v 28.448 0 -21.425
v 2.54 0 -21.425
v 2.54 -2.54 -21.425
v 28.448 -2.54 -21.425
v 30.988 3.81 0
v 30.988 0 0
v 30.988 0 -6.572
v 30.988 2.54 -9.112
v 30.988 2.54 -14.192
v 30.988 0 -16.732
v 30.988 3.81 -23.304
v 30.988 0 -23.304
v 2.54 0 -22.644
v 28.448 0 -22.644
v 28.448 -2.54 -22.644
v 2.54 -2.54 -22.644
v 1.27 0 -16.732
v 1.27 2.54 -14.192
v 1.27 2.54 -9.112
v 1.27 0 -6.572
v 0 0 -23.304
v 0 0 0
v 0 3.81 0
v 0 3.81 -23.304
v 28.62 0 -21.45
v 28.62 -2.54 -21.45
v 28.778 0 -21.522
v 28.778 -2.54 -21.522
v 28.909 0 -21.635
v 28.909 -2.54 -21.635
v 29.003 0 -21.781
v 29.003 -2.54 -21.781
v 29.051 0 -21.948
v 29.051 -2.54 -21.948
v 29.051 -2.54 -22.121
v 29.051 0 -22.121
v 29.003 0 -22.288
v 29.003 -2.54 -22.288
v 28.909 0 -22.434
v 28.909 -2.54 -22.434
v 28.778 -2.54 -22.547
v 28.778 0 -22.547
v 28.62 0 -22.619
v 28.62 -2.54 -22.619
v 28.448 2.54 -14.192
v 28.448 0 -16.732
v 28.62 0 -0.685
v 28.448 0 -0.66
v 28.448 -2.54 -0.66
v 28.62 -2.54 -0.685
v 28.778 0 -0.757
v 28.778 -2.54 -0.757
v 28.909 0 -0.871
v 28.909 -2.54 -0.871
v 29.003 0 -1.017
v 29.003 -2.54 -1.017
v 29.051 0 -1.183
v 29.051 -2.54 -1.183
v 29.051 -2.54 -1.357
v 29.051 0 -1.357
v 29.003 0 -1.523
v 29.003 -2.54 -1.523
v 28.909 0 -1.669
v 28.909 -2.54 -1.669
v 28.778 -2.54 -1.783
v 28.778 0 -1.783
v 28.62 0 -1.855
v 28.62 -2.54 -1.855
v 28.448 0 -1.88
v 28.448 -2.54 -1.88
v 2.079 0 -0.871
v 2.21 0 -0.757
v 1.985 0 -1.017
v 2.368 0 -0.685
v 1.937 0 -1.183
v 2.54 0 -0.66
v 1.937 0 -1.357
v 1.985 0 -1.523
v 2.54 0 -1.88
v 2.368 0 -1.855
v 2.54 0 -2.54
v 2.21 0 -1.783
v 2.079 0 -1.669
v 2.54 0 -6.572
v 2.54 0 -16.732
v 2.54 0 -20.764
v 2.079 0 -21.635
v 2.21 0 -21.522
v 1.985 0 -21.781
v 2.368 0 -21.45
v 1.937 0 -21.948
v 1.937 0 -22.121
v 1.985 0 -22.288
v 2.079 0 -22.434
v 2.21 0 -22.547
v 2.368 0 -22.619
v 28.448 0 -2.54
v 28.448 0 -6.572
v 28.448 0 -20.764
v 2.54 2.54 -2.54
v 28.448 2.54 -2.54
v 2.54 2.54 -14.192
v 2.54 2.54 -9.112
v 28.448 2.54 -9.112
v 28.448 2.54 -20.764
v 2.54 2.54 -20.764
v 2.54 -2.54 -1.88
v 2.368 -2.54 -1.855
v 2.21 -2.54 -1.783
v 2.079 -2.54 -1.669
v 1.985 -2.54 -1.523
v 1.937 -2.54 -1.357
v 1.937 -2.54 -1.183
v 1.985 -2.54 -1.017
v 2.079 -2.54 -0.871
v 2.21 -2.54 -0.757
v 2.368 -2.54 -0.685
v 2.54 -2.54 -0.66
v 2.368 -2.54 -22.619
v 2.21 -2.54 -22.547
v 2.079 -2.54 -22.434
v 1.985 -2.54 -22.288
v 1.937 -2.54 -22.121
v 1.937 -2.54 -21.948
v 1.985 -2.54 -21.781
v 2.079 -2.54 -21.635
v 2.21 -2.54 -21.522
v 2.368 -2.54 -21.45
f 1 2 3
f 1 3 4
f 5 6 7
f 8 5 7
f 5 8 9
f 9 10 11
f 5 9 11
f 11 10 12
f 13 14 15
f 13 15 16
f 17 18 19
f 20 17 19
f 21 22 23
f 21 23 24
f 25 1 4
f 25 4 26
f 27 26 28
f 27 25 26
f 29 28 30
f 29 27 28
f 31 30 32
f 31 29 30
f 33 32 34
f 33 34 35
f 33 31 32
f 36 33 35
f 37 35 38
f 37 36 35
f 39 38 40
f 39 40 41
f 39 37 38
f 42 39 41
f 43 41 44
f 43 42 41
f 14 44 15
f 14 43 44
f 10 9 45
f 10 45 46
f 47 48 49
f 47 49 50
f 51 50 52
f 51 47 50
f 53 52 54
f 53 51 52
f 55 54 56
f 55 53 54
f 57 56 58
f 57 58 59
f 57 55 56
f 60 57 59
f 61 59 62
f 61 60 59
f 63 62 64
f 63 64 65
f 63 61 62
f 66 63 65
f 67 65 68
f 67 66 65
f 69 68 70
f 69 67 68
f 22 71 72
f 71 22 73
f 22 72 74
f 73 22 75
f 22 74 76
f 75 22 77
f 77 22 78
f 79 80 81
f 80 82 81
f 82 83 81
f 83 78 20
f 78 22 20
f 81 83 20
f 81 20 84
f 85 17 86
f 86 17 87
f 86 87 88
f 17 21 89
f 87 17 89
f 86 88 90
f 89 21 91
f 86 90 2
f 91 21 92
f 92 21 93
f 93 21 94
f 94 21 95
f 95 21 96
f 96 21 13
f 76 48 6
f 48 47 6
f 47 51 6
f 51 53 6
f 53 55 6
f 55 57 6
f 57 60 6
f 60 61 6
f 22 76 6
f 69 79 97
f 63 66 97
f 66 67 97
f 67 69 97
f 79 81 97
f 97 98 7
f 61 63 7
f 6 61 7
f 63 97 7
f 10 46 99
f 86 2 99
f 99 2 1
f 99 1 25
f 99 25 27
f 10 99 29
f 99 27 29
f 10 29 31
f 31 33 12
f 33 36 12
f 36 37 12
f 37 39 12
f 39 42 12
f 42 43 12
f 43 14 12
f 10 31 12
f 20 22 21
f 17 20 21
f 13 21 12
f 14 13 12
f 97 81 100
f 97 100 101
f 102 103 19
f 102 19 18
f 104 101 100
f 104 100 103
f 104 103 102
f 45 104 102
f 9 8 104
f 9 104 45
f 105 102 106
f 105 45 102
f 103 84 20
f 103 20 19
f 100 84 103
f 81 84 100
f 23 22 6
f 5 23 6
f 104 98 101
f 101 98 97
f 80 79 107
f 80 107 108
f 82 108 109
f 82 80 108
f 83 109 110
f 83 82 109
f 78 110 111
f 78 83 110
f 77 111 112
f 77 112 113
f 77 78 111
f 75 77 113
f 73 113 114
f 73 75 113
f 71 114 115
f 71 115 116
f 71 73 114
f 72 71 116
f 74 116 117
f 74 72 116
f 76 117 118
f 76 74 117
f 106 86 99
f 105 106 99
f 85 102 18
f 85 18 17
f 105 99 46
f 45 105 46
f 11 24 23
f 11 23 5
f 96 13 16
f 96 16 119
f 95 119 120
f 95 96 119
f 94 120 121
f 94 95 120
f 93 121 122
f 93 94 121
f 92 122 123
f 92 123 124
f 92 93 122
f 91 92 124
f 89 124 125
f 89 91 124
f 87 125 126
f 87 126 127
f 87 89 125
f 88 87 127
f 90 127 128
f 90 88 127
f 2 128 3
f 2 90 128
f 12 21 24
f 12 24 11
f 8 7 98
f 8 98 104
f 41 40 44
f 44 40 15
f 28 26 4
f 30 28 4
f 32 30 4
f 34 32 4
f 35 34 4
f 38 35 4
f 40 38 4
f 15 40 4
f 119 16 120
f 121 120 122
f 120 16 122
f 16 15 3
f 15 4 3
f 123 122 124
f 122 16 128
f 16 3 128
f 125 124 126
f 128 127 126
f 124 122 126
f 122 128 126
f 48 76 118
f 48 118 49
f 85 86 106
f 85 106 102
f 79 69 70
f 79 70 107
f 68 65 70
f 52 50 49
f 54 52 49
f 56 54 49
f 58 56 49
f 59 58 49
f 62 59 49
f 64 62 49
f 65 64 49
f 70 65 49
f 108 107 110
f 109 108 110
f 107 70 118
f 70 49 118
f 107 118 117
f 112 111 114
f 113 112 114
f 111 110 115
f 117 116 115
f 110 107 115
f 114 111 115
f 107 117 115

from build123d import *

# Parameters (mm, degrees)
SKETCH1_W           = 30.988
SKETCH1_H           = 23.3045
BOSS_EXTRUDE1_DEPTH = 3.81
CUT_EXTRUDE1_DEPTH  = 29.718
BOSS_EXTRUDE2_DEPTH = 2.54
SKETCH4_W           = 25.908
SKETCH4_H           = 18.2245
CUT_EXTRUDE2_DEPTH  = 2.54


with BuildPart() as part:
    # Sketch1 → Boss-Extrude1 (new body)
    with BuildSketch(Plane(origin=(0, 0, 0), x_dir=(1, 0, 0), z_dir=(0, 1, 0))):
        with Locations((15.494, 11.65225)):
            Rectangle(SKETCH1_W, SKETCH1_H)
    extrude(amount=BOSS_EXTRUDE1_DEPTH)

    # Sketch2 → Cut-Extrude1 (cut)
    with BuildSketch(Plane(origin=(30.988, 0, 0), x_dir=(0, 0, -1), z_dir=(1, 0, 0))):
        Polygon((6.57225, 0), (9.11225, 2.54), (14.19225, 2.54), (16.73225, 0), align=None)
    extrude(amount=-CUT_EXTRUDE1_DEPTH, mode=Mode.SUBTRACT)

    # Sketch3 → Boss-Extrude2 (add)
    with BuildSketch(Plane.XZ):
        with BuildLine():
            Line((2.54, -0.6604), (28.448, -0.6604))
            ThreePointArc((28.448, -0.6604), (29.0576, -1.27), (28.448, -1.8796))
            Line((28.448, -1.8796), (2.54, -1.8796))
            ThreePointArc((2.54, -1.8796), (1.9304, -1.27), (2.54, -0.6604))
        make_face()
        with BuildLine():
            Line((2.54, -21.4249), (28.448, -21.4249))
            ThreePointArc((28.448, -21.4249), (29.0576, -22.0345), (28.448, -22.6441))
            Line((28.448, -22.6441), (2.54, -22.6441))
            ThreePointArc((2.54, -22.6441), (1.9304, -22.0345), (2.54, -21.4249))
        make_face()
    extrude(amount=BOSS_EXTRUDE2_DEPTH)

    # Sketch4 → Cut-Extrude2 (cut)
    with BuildSketch(Plane.XZ):
        with Locations((15.494, -11.65225)):
            Rectangle(SKETCH4_W, SKETCH4_H)
    extrude(amount=-CUT_EXTRUDE2_DEPTH, mode=Mode.SUBTRACT)


solid = part.part
